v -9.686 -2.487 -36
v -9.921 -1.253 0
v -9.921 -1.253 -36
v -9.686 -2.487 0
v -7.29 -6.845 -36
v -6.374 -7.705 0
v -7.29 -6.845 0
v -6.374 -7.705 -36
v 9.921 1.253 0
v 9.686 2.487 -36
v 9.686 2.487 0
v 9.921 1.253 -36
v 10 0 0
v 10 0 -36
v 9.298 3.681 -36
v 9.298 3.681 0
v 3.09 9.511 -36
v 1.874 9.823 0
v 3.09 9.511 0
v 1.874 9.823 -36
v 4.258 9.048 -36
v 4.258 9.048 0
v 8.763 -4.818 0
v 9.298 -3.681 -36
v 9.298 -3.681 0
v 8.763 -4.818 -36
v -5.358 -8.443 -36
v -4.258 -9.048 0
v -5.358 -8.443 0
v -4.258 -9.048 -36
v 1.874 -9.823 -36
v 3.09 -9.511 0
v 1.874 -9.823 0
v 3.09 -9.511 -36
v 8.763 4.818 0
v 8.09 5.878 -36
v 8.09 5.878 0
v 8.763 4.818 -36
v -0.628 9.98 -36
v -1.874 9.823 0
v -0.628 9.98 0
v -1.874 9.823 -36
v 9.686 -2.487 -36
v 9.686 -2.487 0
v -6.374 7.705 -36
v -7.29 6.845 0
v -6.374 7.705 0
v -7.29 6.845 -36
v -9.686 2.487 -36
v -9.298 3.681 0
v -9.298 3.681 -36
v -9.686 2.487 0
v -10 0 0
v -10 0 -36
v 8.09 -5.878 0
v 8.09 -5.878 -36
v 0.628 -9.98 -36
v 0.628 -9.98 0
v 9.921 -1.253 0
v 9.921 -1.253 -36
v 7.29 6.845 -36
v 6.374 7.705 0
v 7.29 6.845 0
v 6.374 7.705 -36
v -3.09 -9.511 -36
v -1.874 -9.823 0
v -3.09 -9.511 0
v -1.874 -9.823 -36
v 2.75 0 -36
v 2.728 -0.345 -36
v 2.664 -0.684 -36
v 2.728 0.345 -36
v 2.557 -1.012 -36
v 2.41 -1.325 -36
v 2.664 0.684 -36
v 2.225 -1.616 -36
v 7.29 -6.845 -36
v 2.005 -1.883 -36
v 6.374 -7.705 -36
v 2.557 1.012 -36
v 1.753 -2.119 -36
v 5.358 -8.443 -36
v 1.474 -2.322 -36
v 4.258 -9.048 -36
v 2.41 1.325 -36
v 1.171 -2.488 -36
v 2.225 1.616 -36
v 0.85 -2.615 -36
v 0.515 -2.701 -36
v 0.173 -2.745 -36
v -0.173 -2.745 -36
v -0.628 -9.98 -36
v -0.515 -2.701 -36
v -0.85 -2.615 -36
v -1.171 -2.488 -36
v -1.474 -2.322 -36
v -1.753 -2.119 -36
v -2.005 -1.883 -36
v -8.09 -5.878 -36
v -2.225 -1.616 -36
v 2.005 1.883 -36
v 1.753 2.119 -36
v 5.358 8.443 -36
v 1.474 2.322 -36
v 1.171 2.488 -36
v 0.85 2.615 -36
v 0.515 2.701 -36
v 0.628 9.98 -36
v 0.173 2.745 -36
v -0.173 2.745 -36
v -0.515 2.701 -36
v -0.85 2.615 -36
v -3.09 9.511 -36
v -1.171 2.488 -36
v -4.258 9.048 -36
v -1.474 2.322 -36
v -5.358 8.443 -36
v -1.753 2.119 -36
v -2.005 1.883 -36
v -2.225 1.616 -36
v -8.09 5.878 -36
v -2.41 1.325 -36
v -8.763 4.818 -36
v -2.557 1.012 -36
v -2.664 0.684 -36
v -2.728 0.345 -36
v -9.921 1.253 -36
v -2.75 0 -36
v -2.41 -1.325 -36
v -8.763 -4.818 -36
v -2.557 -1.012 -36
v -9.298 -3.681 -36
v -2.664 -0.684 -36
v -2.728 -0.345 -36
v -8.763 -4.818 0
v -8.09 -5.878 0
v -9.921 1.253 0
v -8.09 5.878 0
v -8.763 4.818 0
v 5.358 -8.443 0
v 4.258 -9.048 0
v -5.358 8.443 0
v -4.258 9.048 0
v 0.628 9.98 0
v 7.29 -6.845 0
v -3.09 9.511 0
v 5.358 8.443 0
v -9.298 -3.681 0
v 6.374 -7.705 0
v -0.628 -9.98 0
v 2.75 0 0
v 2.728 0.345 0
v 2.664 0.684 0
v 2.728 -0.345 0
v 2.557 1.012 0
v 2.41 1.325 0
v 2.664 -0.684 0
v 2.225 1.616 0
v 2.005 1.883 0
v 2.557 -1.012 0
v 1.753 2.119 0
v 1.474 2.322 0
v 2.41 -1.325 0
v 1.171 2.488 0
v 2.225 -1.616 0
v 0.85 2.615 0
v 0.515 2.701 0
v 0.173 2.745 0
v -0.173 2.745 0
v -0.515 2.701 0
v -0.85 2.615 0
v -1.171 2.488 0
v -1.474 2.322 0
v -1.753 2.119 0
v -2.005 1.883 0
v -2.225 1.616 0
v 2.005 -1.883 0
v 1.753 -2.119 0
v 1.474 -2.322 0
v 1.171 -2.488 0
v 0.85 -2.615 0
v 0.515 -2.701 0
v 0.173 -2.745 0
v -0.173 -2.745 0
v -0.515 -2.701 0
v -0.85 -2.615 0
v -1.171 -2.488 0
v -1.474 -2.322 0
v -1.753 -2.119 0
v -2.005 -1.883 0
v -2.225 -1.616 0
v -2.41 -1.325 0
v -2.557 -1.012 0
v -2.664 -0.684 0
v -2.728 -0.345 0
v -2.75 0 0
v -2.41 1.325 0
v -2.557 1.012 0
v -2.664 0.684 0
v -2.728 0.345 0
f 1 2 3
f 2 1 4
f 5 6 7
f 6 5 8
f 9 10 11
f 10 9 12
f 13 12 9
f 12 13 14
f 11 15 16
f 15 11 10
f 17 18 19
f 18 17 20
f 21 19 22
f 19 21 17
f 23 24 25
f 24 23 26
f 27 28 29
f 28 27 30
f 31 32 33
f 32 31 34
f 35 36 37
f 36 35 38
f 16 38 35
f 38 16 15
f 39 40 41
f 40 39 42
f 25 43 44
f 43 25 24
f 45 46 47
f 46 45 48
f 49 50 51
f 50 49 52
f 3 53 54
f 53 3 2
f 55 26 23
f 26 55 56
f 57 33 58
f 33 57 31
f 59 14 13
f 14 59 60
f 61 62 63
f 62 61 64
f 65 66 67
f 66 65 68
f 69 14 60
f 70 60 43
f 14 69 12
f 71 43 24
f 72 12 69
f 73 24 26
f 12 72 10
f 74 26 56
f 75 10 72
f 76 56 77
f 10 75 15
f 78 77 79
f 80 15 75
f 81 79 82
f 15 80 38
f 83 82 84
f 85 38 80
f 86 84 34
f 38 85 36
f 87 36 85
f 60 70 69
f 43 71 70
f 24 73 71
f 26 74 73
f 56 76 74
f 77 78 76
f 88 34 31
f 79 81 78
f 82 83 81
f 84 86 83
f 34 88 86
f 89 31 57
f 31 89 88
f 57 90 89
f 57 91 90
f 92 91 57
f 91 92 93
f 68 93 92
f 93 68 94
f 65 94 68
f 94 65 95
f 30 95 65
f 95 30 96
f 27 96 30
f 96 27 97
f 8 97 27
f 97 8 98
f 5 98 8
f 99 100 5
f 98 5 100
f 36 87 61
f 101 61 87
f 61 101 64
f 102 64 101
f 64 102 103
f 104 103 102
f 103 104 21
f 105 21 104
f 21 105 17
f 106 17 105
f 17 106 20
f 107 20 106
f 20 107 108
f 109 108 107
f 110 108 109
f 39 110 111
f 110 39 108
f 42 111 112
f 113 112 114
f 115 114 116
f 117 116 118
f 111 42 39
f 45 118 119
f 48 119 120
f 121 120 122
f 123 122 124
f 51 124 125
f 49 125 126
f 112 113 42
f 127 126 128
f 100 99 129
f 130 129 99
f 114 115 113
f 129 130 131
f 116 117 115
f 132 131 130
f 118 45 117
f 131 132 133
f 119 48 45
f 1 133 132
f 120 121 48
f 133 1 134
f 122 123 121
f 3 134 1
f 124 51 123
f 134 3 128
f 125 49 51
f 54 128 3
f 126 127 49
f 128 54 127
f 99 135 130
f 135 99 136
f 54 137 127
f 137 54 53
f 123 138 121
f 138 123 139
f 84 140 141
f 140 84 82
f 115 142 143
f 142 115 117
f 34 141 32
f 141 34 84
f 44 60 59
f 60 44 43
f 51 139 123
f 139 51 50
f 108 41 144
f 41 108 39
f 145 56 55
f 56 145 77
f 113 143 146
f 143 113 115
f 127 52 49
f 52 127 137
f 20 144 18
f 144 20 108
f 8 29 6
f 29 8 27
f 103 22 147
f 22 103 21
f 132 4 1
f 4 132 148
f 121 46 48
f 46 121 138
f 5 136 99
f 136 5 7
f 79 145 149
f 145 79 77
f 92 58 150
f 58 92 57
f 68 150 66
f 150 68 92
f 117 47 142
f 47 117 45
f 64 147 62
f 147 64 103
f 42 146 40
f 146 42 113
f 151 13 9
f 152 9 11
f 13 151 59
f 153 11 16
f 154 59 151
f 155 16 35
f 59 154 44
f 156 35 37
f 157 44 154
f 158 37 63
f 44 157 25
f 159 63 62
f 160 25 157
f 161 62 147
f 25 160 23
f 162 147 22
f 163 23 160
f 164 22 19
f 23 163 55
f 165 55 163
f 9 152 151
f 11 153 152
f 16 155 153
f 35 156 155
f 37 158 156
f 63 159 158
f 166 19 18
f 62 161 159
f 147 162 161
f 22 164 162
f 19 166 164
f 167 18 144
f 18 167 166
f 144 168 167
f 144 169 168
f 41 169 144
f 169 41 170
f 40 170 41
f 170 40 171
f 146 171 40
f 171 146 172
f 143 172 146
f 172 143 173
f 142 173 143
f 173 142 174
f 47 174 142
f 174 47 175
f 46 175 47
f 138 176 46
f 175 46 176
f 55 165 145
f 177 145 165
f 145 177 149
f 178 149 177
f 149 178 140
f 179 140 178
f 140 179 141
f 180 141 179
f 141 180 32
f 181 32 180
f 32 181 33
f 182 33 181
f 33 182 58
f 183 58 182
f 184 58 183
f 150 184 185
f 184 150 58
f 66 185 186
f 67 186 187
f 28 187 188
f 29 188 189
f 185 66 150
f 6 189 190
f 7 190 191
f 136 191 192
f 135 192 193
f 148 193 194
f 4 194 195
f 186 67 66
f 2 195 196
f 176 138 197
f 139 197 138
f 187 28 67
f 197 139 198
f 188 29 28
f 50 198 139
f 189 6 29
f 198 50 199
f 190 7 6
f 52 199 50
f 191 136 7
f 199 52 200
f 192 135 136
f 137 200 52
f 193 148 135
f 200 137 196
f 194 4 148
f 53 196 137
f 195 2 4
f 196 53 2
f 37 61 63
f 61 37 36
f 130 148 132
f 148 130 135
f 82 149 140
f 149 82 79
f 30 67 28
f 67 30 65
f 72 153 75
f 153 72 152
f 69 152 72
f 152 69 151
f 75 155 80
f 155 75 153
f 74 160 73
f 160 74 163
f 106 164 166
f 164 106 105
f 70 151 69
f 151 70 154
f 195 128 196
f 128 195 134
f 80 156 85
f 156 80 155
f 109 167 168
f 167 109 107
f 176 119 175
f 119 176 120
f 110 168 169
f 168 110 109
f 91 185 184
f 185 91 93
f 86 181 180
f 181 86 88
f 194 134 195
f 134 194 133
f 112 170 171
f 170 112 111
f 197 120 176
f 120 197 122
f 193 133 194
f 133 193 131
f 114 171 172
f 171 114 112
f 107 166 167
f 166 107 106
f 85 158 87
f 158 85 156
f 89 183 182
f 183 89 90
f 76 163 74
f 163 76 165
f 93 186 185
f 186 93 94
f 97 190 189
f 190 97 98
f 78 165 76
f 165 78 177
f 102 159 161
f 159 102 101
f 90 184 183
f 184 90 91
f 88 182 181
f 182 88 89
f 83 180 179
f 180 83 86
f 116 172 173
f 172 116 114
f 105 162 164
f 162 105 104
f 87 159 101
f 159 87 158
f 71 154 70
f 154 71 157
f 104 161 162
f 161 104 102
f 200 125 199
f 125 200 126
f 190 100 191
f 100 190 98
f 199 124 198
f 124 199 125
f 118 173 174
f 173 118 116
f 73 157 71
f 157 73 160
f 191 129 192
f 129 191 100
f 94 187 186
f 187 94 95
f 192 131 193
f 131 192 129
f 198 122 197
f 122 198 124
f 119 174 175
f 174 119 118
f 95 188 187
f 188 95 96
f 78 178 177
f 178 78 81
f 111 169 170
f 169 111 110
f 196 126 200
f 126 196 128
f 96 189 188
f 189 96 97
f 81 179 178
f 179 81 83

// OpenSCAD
$fn = 50;


difference() {
	union() {
		translate(v = [0, 0, -36.0000000000]) {
			cylinder(h = 36, r = 10.0000000000);
		}
	}
	union() {
		#translate(v = [0, 0, -36]) {
			cylinder(h = 36, r = 2.7500000000);
		}
	}
}
